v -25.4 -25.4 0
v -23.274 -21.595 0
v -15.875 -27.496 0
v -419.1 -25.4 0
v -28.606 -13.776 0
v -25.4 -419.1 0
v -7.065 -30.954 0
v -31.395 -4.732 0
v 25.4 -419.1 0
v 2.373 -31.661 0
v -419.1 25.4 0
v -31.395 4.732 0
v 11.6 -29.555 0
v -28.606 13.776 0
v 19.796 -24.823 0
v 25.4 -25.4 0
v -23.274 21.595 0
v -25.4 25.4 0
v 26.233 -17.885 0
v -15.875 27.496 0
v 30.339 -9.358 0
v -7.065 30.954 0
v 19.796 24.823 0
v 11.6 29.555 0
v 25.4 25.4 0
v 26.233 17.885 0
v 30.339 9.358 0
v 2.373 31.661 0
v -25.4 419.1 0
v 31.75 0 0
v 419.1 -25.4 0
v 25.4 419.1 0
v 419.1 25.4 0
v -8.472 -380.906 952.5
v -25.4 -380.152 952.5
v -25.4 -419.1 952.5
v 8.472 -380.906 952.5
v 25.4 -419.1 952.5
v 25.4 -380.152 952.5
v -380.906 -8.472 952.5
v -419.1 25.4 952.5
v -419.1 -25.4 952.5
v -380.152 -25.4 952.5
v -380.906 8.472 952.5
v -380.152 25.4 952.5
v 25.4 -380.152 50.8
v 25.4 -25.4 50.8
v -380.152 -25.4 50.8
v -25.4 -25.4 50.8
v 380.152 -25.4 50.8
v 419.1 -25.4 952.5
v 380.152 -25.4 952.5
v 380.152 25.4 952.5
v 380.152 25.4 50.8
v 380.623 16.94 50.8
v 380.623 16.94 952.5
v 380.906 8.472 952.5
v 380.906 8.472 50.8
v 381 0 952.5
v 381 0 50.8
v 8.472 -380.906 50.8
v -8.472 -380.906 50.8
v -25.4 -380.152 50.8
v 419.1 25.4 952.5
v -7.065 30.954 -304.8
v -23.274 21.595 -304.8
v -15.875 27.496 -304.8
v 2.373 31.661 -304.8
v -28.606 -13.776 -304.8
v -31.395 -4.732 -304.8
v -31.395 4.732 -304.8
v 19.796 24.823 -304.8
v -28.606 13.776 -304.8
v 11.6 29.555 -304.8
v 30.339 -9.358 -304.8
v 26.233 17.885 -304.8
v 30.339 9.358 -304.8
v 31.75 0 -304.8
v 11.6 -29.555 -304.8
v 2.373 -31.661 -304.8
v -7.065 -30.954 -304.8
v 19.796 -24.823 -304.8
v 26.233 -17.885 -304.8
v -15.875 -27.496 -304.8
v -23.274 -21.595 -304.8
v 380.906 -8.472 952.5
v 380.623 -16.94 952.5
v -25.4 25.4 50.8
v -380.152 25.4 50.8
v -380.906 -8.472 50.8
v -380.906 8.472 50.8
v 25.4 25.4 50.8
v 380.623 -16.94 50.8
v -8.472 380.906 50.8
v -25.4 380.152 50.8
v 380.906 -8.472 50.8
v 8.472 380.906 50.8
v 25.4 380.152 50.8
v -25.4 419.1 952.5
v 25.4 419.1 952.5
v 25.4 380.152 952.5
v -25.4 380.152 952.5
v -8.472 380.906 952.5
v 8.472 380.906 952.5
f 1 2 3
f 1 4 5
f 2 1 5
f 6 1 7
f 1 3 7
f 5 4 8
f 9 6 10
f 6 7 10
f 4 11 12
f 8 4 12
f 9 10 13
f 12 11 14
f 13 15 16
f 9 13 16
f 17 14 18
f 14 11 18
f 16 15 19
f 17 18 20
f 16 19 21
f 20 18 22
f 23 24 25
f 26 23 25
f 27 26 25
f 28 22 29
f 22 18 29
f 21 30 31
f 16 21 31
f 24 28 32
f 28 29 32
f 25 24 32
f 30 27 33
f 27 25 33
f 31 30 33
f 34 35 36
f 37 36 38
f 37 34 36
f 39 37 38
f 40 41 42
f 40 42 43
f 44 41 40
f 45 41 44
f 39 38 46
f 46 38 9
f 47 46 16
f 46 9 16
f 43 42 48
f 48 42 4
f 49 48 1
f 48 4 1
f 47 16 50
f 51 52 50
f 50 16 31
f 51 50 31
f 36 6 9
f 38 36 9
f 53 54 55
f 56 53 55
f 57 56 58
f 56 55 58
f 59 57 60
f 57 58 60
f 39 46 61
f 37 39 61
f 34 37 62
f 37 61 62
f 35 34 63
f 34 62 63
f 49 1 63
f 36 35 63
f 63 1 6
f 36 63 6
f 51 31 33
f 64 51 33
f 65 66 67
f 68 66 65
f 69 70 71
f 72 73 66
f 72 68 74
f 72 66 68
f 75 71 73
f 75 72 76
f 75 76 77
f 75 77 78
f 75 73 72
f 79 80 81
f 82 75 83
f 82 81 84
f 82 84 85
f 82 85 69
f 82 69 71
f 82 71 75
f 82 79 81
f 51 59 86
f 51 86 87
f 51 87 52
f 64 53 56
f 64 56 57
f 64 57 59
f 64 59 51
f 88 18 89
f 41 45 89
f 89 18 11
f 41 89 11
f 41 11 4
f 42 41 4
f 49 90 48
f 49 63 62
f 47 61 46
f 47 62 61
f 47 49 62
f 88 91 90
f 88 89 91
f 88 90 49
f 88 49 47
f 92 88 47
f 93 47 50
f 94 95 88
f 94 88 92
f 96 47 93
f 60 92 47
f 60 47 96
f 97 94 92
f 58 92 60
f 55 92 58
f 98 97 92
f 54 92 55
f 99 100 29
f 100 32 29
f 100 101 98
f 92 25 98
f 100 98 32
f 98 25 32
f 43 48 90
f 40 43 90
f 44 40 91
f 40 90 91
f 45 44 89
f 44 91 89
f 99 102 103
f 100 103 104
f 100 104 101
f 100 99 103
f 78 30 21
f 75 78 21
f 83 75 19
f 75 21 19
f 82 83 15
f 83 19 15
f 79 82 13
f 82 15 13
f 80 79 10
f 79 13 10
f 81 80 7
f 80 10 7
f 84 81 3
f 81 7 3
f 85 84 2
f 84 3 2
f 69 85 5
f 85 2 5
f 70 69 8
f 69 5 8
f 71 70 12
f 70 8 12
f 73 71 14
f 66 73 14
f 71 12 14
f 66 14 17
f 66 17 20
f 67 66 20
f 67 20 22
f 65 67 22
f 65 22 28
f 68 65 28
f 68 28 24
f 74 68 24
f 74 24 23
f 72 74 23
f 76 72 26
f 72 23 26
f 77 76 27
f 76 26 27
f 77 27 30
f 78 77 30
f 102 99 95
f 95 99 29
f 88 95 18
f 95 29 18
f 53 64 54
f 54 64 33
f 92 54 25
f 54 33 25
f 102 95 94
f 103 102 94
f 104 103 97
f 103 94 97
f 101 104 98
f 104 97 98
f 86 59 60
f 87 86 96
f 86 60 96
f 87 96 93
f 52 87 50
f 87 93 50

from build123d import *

# Parameters (mm, degrees)
F1_DEPTH = 50.8
F3_DEPTH = 901.7
F4_R     = 31.75
F5_DEPTH = 304.8


with BuildPart() as f1:
    # F0 (on Top) → F1 (new body)
    with BuildSketch(Plane.XY):
        Polygon((25.4, 419.1), (-25.4, 419.1), (-25.4, 25.4), (-419.1, 25.4), (-419.1, -25.4), (-25.4, -25.4), (-25.4, -419.1), (25.4, -419.1), (25.4, -25.4), (419.1, -25.4), (419.1, 25.4), (25.4, 25.4), align=None)
    extrude(amount=F1_DEPTH)

    # F2 (on face) → F3 (join)
    with BuildSketch(Plane.XY.offset(50.8)):
        with BuildLine():
            ThreePointArc((-25.4, 380.15239), (0, 381), (25.4, 380.15239))
            Line((25.4, 380.15239), (25.4, 419.1))
            Line((25.4, 419.1), (-25.4, 419.1))
            Line((-25.4, 419.1), (-25.4, 380.15239))
        make_face()
        with BuildLine():
            ThreePointArc((-380.15239, -25.4), (-381, 0), (-380.15239, 25.4))
            Line((-380.15239, 25.4), (-419.1, 25.4))
            Line((-419.1, 25.4), (-419.1, -25.4))
            Line((-419.1, -25.4), (-380.15239, -25.4))
        make_face()
        with BuildLine():
            Line((25.4, -419.1), (25.4, -380.15239))
            ThreePointArc((25.4, -380.15239), (0, -381), (-25.4, -380.15239))
            Line((-25.4, -380.15239), (-25.4, -419.1))
            Line((-25.4, -419.1), (25.4, -419.1))
        make_face()
        with BuildLine():
            ThreePointArc((380.15239, 25.4), (380.788039, 12.707069), (381, 0))
            ThreePointArc((381, 0), (380.788039, -12.707069), (380.15239, -25.4))
            Line((380.15239, -25.4), (419.1, -25.4))
            Line((419.1, -25.4), (419.1, 25.4))
            Line((419.1, 25.4), (380.15239, 25.4))
        make_face()
    extrude(amount=F3_DEPTH)

    # F4 (on face) → F5 (join)
    with BuildSketch(Plane(origin=(0, 0, 0), x_dir=(1, 0, 0), z_dir=(0, 0, -1))):
        Circle(F4_R)
    extrude(amount=F5_DEPTH)


solid = f1.part
